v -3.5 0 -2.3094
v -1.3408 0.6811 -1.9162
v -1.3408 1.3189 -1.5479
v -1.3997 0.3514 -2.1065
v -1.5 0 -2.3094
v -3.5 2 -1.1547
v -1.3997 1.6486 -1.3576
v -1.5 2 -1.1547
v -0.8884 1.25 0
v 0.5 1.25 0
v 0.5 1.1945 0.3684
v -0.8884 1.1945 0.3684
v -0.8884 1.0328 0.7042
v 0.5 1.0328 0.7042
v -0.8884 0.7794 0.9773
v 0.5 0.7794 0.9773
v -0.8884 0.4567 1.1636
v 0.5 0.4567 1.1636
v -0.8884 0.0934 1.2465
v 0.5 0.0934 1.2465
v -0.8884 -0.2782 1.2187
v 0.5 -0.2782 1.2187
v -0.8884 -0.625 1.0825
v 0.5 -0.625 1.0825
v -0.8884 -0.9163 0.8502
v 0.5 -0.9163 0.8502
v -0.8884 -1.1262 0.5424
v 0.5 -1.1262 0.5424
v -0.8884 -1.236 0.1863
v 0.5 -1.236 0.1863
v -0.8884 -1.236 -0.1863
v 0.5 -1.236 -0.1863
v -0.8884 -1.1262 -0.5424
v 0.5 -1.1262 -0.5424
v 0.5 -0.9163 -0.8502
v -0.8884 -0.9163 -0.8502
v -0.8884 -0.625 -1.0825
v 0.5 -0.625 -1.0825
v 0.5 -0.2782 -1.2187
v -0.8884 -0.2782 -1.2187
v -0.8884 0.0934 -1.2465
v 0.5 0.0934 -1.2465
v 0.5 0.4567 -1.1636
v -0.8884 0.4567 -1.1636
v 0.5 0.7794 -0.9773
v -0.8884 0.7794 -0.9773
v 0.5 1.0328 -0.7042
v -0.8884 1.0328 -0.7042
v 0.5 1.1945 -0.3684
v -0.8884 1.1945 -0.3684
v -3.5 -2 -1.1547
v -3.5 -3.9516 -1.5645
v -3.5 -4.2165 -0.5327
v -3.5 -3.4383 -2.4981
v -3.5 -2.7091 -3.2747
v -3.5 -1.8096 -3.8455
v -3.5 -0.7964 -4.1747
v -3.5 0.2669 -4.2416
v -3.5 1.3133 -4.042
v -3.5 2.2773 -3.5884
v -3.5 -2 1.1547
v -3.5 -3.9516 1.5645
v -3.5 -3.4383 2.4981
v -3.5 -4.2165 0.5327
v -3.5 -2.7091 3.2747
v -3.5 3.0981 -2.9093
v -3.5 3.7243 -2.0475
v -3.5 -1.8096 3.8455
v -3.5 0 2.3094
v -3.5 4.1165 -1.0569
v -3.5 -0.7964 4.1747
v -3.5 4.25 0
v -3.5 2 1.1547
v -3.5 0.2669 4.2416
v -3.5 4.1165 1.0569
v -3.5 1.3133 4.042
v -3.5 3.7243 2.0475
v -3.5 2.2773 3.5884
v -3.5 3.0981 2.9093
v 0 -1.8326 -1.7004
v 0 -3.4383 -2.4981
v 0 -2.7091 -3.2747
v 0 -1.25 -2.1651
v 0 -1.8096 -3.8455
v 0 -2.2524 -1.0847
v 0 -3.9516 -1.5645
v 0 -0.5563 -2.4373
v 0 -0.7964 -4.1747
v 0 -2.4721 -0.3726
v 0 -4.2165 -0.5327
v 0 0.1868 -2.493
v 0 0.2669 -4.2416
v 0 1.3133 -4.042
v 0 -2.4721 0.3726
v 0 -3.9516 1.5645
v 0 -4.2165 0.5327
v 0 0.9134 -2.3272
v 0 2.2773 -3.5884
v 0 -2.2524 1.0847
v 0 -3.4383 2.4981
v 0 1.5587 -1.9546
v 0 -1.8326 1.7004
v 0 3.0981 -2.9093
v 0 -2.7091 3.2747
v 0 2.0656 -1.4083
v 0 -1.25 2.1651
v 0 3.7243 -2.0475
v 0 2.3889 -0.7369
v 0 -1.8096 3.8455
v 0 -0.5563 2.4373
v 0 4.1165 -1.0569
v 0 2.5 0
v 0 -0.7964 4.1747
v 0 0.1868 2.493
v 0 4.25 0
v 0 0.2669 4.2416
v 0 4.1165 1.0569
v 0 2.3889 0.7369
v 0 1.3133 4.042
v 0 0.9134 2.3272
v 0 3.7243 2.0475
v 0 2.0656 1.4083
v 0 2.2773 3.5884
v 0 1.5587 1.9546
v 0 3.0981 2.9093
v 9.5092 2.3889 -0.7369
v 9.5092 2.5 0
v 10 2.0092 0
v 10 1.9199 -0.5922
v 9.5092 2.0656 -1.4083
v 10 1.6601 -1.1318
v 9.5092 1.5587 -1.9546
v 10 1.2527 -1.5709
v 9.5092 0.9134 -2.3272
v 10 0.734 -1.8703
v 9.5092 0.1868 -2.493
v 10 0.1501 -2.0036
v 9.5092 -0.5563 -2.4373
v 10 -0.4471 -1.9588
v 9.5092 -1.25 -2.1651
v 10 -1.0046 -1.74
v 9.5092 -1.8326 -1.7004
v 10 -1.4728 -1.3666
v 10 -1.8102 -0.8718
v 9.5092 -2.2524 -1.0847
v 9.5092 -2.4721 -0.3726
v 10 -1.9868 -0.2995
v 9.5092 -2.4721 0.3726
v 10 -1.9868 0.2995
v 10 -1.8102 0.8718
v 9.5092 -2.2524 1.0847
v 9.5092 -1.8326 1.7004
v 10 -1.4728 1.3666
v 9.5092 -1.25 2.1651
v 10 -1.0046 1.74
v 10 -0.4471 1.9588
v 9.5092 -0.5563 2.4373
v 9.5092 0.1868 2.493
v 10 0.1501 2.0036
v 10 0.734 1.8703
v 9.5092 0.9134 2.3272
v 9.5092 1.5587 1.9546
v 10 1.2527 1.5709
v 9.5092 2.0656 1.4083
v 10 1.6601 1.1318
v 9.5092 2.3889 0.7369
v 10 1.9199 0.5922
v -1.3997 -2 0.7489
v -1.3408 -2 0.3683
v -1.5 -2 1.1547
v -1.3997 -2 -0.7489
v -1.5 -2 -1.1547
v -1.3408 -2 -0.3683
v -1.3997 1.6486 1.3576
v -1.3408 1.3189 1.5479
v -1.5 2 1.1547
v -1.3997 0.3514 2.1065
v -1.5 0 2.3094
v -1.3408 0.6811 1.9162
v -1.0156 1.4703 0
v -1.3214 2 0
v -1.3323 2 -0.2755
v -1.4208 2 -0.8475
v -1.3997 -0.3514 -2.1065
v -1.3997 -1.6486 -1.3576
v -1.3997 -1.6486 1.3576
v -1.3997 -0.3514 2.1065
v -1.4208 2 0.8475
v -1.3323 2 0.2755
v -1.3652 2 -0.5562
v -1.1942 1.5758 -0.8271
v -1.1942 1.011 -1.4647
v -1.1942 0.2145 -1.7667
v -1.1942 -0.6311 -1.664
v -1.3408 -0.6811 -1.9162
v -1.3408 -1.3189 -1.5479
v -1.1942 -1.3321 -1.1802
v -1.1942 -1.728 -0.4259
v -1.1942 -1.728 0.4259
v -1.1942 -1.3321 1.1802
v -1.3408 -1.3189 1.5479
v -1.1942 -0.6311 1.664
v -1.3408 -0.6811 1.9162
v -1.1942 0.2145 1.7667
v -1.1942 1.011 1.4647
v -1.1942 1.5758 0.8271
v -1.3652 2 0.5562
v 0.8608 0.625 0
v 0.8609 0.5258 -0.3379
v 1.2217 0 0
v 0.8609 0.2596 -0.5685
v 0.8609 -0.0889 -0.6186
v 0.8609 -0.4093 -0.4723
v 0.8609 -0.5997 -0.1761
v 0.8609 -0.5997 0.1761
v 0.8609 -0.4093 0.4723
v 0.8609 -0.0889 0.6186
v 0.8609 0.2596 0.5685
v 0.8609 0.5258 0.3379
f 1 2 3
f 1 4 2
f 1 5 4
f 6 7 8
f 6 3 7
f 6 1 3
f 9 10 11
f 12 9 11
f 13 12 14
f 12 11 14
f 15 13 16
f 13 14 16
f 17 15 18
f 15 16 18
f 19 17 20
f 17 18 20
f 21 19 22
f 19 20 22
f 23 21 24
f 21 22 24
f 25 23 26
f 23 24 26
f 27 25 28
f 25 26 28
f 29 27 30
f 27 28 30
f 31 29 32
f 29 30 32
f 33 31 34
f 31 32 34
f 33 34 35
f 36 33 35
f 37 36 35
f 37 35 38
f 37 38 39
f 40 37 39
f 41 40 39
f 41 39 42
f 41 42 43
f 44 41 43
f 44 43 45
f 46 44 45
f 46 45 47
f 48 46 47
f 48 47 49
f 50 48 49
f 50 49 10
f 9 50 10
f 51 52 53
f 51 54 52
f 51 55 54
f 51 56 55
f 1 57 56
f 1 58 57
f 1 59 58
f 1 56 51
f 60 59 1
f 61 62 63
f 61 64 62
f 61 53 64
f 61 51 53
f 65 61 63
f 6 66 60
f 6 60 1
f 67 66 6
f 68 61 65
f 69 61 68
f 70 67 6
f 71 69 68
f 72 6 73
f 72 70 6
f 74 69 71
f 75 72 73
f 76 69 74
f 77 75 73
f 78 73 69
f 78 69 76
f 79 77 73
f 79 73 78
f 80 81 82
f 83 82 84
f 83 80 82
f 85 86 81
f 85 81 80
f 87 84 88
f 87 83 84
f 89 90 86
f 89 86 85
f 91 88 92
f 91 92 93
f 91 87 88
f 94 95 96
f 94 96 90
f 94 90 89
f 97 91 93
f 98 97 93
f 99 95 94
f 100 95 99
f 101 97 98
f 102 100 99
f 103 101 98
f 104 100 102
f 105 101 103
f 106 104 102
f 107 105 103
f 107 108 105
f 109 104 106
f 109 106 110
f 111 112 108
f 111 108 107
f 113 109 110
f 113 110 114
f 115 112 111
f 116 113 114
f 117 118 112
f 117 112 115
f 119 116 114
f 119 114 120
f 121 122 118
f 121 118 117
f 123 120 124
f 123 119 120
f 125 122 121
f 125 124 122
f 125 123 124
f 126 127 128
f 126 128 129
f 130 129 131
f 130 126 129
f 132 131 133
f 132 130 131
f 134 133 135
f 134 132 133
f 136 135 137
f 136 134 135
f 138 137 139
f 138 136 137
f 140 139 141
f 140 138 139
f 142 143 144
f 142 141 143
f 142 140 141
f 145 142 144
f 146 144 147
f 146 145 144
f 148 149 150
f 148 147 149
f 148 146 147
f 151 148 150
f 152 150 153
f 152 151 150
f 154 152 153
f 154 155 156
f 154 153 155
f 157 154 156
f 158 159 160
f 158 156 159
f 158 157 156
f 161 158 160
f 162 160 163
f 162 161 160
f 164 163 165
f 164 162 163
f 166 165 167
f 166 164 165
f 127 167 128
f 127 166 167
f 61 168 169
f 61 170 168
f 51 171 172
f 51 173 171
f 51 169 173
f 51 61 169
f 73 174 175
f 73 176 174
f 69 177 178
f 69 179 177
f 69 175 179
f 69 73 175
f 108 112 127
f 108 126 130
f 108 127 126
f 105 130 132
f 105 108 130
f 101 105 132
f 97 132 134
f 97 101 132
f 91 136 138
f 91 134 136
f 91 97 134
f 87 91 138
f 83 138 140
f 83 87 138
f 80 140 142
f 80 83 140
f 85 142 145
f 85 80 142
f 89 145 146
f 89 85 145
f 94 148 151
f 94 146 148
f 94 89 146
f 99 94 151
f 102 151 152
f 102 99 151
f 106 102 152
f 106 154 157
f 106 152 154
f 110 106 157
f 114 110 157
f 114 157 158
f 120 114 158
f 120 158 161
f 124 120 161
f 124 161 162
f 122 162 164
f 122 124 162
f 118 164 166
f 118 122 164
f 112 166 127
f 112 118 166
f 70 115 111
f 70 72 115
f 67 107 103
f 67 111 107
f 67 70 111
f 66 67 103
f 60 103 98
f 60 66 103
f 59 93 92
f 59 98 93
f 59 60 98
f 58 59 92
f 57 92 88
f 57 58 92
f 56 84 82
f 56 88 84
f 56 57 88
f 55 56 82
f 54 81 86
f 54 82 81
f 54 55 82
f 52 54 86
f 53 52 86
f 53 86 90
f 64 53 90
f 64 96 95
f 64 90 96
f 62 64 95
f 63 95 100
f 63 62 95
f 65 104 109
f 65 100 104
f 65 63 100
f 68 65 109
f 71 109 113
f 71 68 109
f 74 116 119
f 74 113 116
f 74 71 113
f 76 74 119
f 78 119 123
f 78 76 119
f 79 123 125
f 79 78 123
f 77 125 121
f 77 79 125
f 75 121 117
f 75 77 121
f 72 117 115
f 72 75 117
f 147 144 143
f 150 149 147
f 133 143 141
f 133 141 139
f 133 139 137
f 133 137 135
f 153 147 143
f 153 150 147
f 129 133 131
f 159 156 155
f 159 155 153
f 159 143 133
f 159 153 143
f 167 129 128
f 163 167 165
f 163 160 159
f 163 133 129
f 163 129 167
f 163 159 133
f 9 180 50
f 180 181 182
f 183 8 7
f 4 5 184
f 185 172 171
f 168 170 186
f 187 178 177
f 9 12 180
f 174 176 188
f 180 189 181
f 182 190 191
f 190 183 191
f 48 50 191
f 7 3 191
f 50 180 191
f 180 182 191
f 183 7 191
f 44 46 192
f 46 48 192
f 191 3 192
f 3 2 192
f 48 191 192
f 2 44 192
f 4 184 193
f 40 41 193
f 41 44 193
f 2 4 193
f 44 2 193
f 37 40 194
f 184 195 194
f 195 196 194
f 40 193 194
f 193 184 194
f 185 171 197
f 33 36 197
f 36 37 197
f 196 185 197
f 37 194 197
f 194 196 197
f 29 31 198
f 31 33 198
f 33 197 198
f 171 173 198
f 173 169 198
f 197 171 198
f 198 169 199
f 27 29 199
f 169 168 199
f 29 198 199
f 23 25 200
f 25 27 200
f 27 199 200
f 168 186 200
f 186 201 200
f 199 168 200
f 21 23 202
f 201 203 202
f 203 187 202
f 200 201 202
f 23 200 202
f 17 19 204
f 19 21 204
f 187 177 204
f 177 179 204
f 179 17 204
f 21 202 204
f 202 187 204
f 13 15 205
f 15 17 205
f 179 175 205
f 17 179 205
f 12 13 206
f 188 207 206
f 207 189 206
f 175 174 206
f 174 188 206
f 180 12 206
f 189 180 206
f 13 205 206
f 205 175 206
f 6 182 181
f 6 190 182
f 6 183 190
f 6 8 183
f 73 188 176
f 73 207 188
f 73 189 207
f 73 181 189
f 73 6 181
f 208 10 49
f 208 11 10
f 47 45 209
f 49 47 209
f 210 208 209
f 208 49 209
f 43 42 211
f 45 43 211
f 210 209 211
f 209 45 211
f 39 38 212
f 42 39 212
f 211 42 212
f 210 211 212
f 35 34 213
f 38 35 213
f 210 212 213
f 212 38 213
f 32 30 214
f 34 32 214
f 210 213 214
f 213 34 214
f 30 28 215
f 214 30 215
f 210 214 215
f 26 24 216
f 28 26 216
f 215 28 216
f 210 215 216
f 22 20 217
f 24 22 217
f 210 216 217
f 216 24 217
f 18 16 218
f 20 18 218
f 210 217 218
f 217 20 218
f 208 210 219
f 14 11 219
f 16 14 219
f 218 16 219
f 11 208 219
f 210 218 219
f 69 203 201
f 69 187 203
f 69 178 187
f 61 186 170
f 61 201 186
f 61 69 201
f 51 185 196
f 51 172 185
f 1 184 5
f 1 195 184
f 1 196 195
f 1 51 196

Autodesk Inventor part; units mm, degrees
ref_plane "YZ Plane" through (0, 0, 0) normal (1, 0, 0) x (0, 1, 0)
ref_plane "XZ Plane" through (0, 0, 0) normal (0, 1, 0) x (-1, 0, 0)
sketch "草圖1" plane through (0, 0, 0) normal (0, 0, 1) x (1, 0, 0)
  line L0 (1.2217, 0) -> (10, 0)
  line L1 (10, 0) -> (10, 2.5)
  line L2 (10, 2.5) -> (0, 2.5)
  line L3 (0, 2.5) -> (0, 4.25)
  line L4 (0, 4.25) -> (-3.5, 4.25)
  line L5 (-3.5, 4.25) -> (-3.5, 2.3094)
  line L6 (-3.5, 2.3094) -> (-1.5, 2.3094)
  line L7 (-1.5, 2.3094) -> (-0.8884, 1.25)
  line L8 (-6.2, 0) -> (12.7, 0) projected
  line L9 (0, -0.85) -> (0, 5.1) projected
  line L10 (-0.8884, 1.25) -> (0.5, 1.25)
  line L11 (0.5, 1.25) -> (1.2217, 0)
  line L12 (-3.5, 2.3094) -> (-3.5, 0) construction
  dimension "d0" = 3.5
  dimension "d1" = 2
  dimension "d2" = 60
  dimension "d3" = 5
  dimension "d4" = 4.6188
  dimension "d5" = 8.5
  dimension "d15" = 4
  dimension "d16" = 2.5
  dimension "d17" = 10
revolve "本體" add sketch "草圖1" angle 360 about axis through (1.2217, 0, 0) along (1, 0, 0) contours L11 L10 L9 L2 L1 L0 | L10 L7 L6 L5 L4 L3 L9
sketch "草圖2" plane through (-3.5, 0, 0) normal (-1, 0, 0) x (0, 0, 1)
  circle A0 centre (0, 0) radius 2.3094 projected
  line L0 (0, -5.95) -> (0, 5.95) projected
  line L1 (-5.95, 0) -> (5.95, 0) projected
  line L2 (2.3094, 0) -> (1.1547, -2)
  line L3 (1.1547, -2) -> (-1.1547, -2)
  line L4 (-1.1547, -2) -> (-2.3094, 0)
  line L5 (-2.3094, 0) -> (-1.1547, 2)
  line L6 (-1.1547, 2) -> (1.1547, 2)
  line L7 (1.1547, 2) -> (2.3094, 0)
extrude "塞槽" add sketch "草圖2" against normal up to next contours L7 A0 | A0 L2 | L6 L0 A0 | A0 L0 L3 | L0 L6 A0 | A0 L3 L0 | L4 A0 | A0 L5
thread "螺紋" size "M5x0.8" class "6g" standard "ISO Metric profile" length 7.4
chamfer "倒角1" distance 0.4908 distance2 0.4908 1 edges at (10, -2.5, 0) measured on face at (10, -0.7741, -0.6858)
ref_plane "Work Plane1" through (5, 0, 0) normal (0, 0.5, 0.8660254) x (1, 0, 0)
equation "\"d7\" = GEL"
equation "\"d9\" = -0.5 * SPD + 0.5 * GD"
equation "\"d12\" = GUL"
equation "\"d0\" = KOH"
equation "\"d1\" = INTI"
equation "\"d3\" = GD"
equation "\"d4\" = 1.1547 * SW"
equation "\"d5\" = KOD"
equation "\"d15\" = INFT"
equation "\"d16\" = SDT"
equation "\"d17\" = NLG"
equation "\"GD\" = NND"
equation "\"NLG\" = 10"
equation "\"GEL\" = 7.4"
equation "\"KOD\" = 8.5"
equation "\"KOH\" = 3.5"
equation "\"GUL\" = 0.61345 * PTC"
equation "\"SW\" = 4"
equation "\"INTI\" = 2"
equation "\"SPD\" = NND - 1.2269 * PTC"
equation "\"SDT\" = 2.5"
equation "\"INFT\" = 4"
equation "\"TOA\" = 30deg"
equation "\"GD1\" = THREADDIA - 1.2269 * PTC"
equation "\"THREADDIA\" = 5"
equation "\"BDM\" = NND"
equation "\"RR\" = 0.5"
equation "\"PTC\" = 0.8"
equation "\"NND\" = 5"
equation "\"SLG\" = 2.6"
equation "\"GAL\" = 0.61345 * PTC"
equation "\"E0\" = 1.155 * SW"
properties part number "CNS 4557 - M5 x 10" material "鋼、軟鋼"
